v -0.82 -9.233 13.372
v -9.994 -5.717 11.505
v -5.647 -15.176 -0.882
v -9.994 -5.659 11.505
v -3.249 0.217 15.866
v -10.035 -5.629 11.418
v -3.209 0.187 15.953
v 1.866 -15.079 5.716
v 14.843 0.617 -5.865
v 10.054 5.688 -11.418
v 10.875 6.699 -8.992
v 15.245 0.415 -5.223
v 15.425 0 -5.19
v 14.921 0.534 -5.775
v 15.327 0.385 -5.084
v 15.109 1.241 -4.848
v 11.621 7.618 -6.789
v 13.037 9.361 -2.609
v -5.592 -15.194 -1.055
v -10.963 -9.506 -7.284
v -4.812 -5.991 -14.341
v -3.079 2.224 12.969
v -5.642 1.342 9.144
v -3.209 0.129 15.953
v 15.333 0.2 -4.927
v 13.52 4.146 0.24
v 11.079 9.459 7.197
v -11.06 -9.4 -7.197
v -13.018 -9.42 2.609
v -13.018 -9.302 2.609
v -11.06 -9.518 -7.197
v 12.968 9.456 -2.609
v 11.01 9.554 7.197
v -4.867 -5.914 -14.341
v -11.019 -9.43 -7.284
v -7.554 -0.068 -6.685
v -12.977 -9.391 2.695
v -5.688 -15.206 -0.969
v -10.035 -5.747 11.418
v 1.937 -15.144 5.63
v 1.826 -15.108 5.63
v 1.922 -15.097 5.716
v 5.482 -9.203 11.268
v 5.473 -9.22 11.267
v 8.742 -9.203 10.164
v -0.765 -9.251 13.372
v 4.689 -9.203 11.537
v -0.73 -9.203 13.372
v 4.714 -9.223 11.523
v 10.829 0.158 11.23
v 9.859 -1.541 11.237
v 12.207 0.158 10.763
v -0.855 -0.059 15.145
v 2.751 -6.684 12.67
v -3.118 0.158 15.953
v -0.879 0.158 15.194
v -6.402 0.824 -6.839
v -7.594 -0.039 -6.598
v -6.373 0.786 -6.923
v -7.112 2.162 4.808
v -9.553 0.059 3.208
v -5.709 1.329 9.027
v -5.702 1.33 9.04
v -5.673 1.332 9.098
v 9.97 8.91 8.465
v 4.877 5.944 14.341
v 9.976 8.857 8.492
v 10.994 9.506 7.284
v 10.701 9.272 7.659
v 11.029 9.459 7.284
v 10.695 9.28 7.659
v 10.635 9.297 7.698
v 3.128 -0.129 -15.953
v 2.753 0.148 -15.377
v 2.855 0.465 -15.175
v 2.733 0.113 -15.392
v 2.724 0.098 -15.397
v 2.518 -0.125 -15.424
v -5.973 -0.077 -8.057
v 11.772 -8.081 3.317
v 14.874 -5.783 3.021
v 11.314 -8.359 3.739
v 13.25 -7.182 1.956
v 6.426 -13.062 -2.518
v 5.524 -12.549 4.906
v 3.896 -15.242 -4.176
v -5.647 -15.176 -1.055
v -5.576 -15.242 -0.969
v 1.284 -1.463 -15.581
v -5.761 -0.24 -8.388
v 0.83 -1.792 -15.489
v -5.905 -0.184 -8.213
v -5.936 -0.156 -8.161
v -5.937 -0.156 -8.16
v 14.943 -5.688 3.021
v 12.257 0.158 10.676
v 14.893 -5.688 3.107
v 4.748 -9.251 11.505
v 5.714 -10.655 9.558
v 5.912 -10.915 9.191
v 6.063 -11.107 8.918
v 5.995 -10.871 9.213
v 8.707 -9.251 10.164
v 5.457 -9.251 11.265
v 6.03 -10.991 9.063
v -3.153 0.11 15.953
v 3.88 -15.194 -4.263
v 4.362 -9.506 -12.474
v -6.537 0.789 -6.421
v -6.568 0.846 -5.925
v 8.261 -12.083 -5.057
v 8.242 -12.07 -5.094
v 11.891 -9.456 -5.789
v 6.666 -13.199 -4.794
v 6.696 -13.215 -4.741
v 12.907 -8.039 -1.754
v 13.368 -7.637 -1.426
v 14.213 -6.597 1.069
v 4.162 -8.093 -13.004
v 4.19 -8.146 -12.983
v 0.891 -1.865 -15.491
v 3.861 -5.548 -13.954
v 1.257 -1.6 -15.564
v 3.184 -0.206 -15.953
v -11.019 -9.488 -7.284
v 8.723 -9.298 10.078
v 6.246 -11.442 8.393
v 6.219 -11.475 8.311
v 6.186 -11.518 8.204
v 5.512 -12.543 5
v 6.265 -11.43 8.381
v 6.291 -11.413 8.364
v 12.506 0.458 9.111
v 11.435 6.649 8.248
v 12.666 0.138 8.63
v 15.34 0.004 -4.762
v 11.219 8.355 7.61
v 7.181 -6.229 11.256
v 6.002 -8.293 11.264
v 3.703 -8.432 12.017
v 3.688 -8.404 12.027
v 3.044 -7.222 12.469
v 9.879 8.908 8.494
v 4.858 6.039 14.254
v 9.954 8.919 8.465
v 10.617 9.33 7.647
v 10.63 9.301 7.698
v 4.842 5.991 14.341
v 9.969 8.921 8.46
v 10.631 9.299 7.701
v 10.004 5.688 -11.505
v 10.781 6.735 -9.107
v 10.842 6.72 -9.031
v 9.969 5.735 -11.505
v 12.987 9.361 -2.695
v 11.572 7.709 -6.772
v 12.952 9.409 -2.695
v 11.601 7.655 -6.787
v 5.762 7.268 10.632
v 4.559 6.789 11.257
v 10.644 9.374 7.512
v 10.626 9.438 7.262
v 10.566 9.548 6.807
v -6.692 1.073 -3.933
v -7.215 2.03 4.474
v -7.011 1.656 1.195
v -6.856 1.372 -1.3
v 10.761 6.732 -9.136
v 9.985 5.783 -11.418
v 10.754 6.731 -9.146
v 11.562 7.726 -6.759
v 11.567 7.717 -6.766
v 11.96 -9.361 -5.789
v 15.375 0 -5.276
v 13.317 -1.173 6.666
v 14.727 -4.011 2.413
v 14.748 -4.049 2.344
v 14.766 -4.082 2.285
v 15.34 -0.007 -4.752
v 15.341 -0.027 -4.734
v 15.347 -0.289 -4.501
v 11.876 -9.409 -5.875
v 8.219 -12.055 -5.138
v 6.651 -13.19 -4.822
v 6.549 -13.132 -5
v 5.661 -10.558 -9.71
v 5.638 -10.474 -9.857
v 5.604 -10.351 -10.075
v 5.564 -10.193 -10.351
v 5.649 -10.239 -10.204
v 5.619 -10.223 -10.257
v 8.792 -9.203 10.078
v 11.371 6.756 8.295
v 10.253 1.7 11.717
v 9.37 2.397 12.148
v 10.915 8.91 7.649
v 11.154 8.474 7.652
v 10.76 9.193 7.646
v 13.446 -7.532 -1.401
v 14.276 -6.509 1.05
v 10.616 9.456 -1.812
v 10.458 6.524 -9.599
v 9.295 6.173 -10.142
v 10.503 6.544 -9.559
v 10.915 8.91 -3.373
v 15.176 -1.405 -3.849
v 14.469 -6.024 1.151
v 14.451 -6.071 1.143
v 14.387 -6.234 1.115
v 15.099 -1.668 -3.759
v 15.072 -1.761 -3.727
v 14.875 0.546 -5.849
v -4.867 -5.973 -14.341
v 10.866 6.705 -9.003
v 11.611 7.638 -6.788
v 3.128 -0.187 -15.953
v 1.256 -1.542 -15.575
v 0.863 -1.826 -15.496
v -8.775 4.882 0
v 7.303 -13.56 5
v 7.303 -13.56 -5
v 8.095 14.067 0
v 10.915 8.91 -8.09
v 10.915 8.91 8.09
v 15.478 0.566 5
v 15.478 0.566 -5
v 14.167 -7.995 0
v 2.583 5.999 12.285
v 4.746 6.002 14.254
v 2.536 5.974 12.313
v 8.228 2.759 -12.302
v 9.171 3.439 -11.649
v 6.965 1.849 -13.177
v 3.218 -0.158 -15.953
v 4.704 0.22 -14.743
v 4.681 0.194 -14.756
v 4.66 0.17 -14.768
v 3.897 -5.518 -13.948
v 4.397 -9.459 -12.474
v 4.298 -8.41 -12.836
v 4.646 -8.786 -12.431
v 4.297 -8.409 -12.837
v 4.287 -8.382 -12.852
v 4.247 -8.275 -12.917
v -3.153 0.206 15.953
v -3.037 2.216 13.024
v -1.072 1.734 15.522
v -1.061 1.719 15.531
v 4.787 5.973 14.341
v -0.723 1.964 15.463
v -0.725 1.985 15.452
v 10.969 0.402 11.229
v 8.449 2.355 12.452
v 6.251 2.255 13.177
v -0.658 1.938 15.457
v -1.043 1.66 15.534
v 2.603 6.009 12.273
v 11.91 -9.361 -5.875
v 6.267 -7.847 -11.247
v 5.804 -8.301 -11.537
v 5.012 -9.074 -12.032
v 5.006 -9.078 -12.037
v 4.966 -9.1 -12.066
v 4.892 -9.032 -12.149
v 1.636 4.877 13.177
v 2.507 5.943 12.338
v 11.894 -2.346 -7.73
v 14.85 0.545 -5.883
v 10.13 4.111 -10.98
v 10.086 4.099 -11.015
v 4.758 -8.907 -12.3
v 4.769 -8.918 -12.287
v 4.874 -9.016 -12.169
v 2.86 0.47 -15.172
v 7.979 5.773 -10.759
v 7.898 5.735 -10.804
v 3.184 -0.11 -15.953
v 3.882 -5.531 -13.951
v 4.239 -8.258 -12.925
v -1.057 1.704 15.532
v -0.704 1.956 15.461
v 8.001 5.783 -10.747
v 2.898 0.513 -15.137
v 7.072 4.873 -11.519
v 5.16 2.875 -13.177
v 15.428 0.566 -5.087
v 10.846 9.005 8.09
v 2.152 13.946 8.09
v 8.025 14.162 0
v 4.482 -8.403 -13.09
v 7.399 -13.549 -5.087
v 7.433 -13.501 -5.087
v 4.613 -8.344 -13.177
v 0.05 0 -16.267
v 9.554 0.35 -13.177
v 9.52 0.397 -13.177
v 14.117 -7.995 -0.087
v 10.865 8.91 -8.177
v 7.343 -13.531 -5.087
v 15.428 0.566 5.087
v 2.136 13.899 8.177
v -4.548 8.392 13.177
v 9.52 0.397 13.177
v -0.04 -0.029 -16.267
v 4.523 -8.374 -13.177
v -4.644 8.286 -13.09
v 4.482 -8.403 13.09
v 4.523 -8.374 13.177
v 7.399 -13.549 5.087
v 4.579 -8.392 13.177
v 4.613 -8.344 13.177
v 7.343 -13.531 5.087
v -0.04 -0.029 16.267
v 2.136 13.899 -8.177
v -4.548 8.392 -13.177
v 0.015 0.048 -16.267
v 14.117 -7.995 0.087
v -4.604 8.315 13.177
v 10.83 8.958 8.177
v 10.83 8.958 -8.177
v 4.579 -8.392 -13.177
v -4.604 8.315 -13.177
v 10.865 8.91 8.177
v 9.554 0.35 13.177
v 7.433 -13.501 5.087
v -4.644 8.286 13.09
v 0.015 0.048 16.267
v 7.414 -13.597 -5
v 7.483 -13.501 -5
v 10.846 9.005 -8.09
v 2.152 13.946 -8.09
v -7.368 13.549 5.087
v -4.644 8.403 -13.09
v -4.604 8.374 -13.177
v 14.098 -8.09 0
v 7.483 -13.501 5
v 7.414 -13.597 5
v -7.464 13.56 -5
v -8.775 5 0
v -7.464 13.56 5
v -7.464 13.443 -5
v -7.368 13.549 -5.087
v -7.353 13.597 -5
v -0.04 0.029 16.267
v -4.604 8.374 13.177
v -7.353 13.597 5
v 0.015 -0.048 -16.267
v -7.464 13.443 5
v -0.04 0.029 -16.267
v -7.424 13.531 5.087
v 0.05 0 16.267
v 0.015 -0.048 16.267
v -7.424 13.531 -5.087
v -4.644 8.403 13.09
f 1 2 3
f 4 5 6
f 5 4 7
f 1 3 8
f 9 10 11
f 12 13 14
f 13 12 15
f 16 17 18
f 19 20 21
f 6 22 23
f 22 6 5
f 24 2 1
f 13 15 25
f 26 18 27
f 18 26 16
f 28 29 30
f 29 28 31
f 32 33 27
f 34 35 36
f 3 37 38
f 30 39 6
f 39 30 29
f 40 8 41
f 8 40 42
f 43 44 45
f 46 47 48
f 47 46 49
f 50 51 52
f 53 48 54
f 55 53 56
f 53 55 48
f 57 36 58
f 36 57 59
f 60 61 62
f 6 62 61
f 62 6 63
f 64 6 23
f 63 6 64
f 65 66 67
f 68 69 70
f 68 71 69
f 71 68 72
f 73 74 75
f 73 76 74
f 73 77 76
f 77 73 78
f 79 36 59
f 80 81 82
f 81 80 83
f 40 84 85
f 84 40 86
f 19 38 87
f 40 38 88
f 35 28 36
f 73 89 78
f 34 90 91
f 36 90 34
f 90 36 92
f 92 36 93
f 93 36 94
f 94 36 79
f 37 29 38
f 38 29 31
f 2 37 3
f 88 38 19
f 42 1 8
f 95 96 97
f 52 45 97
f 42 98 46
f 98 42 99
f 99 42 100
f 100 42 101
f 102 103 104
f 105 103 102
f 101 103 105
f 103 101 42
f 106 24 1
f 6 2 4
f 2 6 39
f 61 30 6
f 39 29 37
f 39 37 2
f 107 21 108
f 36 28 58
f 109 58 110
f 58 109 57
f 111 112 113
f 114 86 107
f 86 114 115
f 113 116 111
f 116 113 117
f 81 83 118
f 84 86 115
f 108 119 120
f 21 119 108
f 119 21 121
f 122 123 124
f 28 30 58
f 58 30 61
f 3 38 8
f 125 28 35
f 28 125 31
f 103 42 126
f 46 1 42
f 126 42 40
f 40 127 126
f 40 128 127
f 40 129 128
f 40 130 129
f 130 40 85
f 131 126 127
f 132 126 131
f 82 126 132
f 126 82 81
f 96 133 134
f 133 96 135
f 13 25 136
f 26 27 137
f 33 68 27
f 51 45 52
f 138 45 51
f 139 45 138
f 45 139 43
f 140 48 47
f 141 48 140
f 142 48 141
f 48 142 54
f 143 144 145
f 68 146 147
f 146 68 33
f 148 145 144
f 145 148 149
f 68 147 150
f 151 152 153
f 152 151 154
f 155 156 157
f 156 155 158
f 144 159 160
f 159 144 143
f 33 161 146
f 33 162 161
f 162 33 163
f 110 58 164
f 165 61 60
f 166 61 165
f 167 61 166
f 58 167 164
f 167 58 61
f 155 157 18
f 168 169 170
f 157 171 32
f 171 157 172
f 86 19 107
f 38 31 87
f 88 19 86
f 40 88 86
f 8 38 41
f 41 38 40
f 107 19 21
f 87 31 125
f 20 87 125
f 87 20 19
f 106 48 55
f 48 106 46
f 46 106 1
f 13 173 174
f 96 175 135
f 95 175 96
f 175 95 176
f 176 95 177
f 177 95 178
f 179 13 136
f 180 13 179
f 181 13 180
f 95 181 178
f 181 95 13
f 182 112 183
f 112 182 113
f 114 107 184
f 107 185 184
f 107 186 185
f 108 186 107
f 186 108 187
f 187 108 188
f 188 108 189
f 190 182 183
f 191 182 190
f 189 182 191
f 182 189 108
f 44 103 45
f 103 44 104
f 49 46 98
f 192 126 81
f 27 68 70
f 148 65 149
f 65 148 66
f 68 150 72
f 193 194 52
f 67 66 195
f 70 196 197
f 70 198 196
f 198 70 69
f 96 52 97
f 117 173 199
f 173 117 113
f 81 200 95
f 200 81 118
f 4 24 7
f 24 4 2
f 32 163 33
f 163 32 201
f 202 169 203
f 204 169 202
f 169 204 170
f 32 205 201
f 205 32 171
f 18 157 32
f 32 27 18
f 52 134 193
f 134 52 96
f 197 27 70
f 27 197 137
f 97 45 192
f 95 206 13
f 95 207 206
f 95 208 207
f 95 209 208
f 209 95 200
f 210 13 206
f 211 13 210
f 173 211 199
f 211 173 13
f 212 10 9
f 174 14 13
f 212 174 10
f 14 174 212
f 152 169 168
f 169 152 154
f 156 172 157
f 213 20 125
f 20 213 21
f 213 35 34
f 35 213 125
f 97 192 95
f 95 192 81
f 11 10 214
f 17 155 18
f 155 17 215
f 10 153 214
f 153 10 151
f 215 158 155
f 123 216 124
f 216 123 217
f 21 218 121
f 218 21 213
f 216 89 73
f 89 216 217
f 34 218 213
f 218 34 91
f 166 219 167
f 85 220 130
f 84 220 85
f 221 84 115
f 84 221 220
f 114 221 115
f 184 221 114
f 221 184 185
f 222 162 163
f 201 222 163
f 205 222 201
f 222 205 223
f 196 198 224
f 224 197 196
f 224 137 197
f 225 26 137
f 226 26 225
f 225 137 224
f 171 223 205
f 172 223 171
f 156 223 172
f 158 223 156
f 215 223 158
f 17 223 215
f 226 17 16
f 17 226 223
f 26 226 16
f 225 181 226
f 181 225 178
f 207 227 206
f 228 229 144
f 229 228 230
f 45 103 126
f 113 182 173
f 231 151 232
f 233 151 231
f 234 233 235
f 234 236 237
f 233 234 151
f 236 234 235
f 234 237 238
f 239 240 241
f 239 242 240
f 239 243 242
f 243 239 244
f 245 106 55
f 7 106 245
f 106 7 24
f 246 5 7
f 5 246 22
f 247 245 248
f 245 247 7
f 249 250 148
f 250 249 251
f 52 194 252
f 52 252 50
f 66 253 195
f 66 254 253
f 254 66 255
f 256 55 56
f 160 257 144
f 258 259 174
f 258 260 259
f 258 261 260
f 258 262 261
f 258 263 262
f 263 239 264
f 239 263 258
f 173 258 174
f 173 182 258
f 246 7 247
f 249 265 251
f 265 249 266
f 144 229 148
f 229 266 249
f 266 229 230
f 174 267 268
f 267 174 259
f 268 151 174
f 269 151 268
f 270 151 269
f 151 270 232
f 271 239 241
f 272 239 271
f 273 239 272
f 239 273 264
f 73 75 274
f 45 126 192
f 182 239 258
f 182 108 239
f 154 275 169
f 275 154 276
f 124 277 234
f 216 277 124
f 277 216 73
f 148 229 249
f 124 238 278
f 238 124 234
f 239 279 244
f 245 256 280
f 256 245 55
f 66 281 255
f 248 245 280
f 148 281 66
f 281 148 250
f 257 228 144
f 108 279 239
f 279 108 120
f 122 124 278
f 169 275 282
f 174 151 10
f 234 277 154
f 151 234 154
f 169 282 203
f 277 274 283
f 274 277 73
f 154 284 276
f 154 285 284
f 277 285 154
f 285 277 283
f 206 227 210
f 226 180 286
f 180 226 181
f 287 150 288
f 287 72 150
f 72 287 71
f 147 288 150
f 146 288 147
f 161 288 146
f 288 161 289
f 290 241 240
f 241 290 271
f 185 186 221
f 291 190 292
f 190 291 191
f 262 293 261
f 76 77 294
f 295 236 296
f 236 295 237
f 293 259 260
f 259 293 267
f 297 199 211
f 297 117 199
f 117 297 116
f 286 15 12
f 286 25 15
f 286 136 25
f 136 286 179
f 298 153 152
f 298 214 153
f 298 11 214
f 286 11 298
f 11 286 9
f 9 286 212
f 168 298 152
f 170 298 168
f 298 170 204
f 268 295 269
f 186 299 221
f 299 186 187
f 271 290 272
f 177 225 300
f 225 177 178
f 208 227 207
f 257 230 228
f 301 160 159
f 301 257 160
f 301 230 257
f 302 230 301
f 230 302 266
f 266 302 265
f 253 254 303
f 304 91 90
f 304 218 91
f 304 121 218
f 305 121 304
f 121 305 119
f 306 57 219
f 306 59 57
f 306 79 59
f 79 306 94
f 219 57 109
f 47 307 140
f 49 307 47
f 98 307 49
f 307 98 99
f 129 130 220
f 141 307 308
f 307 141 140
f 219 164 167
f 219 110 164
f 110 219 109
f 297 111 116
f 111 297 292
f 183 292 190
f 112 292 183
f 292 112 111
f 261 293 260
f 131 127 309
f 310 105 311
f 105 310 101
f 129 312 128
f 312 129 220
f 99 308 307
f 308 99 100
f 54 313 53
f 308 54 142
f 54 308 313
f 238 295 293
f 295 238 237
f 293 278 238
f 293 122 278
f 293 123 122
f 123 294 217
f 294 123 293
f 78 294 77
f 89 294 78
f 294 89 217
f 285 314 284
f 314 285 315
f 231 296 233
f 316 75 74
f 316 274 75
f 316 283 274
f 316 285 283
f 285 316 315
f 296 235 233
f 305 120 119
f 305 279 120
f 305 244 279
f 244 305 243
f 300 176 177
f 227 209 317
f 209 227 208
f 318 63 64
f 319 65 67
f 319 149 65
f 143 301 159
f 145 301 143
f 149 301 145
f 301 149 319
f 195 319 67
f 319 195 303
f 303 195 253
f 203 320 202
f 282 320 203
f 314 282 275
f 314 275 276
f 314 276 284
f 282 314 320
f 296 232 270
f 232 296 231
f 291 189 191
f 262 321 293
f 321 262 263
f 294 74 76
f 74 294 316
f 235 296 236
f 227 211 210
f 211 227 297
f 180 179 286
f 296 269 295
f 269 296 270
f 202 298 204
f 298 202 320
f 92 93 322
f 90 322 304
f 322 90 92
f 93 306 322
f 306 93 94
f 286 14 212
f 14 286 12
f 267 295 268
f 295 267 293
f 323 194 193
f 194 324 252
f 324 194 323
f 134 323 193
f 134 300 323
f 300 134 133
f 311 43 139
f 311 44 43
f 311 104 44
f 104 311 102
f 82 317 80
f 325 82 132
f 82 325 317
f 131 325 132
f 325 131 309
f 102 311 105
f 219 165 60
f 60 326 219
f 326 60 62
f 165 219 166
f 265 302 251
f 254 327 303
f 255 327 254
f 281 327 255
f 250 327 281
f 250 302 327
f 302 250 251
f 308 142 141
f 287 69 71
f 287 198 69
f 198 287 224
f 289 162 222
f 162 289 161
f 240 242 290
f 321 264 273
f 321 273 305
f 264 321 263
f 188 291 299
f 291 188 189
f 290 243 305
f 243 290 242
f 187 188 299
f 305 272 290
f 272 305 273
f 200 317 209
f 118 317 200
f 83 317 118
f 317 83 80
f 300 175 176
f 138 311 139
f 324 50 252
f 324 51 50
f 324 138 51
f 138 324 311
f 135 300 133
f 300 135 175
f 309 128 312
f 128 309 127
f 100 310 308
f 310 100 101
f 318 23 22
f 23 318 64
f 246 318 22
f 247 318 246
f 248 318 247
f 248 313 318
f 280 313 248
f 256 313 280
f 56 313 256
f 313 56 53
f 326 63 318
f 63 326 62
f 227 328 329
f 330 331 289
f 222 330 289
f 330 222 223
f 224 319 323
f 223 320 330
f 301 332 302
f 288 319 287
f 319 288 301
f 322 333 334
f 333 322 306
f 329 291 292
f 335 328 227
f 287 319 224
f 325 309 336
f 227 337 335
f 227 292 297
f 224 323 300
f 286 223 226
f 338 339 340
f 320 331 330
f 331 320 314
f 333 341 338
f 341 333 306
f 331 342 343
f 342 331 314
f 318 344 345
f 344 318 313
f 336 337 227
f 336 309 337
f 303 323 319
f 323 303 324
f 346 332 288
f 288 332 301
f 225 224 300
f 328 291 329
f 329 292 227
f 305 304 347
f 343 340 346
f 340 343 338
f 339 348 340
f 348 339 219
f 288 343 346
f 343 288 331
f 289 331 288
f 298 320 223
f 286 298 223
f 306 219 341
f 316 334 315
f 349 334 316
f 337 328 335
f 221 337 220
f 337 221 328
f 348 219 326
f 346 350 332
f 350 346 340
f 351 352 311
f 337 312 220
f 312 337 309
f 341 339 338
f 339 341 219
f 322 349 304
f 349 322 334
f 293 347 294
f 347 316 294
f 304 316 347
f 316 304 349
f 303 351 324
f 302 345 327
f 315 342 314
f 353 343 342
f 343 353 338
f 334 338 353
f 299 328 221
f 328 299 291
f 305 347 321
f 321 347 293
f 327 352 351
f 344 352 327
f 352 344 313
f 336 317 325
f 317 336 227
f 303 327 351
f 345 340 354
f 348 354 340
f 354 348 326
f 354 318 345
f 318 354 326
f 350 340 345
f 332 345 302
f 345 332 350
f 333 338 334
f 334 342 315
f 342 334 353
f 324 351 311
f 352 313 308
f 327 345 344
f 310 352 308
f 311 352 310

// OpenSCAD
// Auto-generated OpenSCAD file

    inner_points = 10*[[3.624317002584078e-13, 2.953319001906976e-13, 1.618033988749895], [-3.624317002584078e-13, -2.953319001906976e-13, -1.618033988749895], [1.4067368092917045, -0.799453274515584, -1.6918183476653185e-13], [0.799453274515584, 1.4067368092917045, -4.358384739871853e-13], [-0.4563237566115435, 0.834432217941957, 1.3090169943748973], [-0.45632375661213, 0.8344322179414793, -1.3090169943749976], [0.45632375661213, -0.8344322179414793, 1.3090169943749976], [0.4563237566115435, -0.834432217941957, -1.3090169943748973], [0.9504130526801611, 0.03497894342637298, 1.309016994374728], [0.9504130526795745, 0.03497894342589519, -1.3090169943751668], [-0.7383473480718745, 1.350139689937751, 0.49999999999991895], [-0.7383473480720981, 1.3501396899375684, -0.500000000000081], [0.7383473480720981, -1.3501396899375684, 0.500000000000081], [0.7383473480718745, -1.350139689937751, -0.49999999999991895], [1.5378006225876821, 0.056597119354135916, 0.4999999999996452], [1.5378006225874585, 0.056597119353953396, -0.5000000000003548], [0.21206570460806262, 1.3851186333639414, 0.8090169943746471], [0.21206570460770024, 1.3851186333636463, -0.8090169943752478], [1.0814768659759149, 0.8910293372959104, 0.8090169943745426], [1.0814768659755525, 0.8910293372956152, -0.8090169943753523], [-0.8694111613678522, 0.49408929606803104, 1.0456012416478531e-13], [-0.5873875699075214, -0.02161817592776291, 0.809016994375083], [-0.5873875699078839, -0.021618175928058286, -0.8090169943748119], [-0.13106381329575384, -0.8560503938695374, 0.5000000000001856], [-0.13106381329597788, -0.8560503938697199, -0.49999999999981437]];

    outer_points = 10*[[-0.4827045868491299, -0.5943615441771533, -1.4253998124694895], [0.4827045868491299, 0.5943615441771533, 1.4253998124694895], [1.5325422089871936, 0.0, -0.5189878287807413], [0.19064272411334998, -1.5049147296618652, 0.56295736689317], [-1.097875476912321, -0.9458928165929492, -0.7197153641977476], [-0.31684304886495324, 0.01580436349155695, 1.5866299799356127], [0.31684304886495324, -0.01580436349155695, -1.5866299799356127], [1.097875476912321, 0.9458928165929492, 0.7197153641977476], [0.43466673207487266, -0.9458928165929492, -1.2387031929784889], [1.2156991601222404, 0.01580436349155695, 1.0676421511548713], [-1.2936952502100056, -0.9361251827846091, 0.2608758909720249], [-0.9953674090117679, -0.5687895468772561, 1.1418214226358954], [0.9953674090117679, 0.5687895468772561, -1.1418214226358954], [1.2936952502100056, 0.9361251827846091, -0.2608758909720249], [1.186010133125118, -0.9361251827846091, -0.5788640557427255], [1.4843379743233558, -0.5687895468772561, 0.3020814759211451], [-0.5607006769368953, -1.5146823634702054, -0.09688177034259327], [-0.07799609008776537, -0.9203208192930521, 1.3285180421268963], [0.38646249741103483, -1.5146823634702054, -0.4176338882766023], [0.8691670842601649, -0.9203208192930521, 1.0077659241928874], [-0.9471631743479302, 0.0, 0.32075211793400904], [-0.7513434010502453, -0.009767633808340115, -0.6598391372357633], [-0.26863881420111535, 0.5845939103688131, 0.7655606752337263], [0.04820423466383783, 0.5687895468772561, -0.8210693047018864], [0.34653207586207563, 0.9361251827846091, 0.059876226961984164]];

    // Convex hull for inner set (I)
    module inner_hull() {
        hull() {
            for (p = inner_points) {
                translate(p) sphere(r=0.1);
            }
        }
    }

    // Convex hull for outer set (O) minus inner hull (O \ I)
    module outer_minus_inner() {
        difference() {
            hull() {
                for (p = outer_points) {
                    translate(p) sphere(r=0.1);
                }
            }
            inner_hull(); // Subtract inner hull
        }
    }

    // Convex hull for outer set (O) minus all translated inner hulls
    module outer_minus_AllTranslationInner() {
        difference() {
            hull() {
                for (p = outer_points) {
                    translate(p) sphere(r=0.1);
                }
            }
            hull() {
                translate([0,0,50]) inner_hull();
                translate([0,0,-50]) inner_hull();
            }; // Subtract translated inner hulls
        }
    }

    // Difference between outer_minus_inner and outer_minus_AllTranslationInner
    module outer_minus_inner_diff() {
        difference() {
            // Outer minus inner
            difference() {
                hull() {
                    for (p = outer_points) {
                        translate(p) sphere(r=0.1);
                    }
                }
                inner_hull();
            }

            // Subtract Outer minus AllTranslationInner
            difference() {
                hull() {
                    for (p = outer_points) {
                        translate(p) sphere(r=0.1);
                    }
                }
                hull() {
                    translate([0,0,50]) inner_hull();
                    translate([0,0,-50]) inner_hull();
                };
            }
        }
    }

    // Rendering all with colors applied
    color([1, 0, 0, 0.5]) inner_hull(); // Transparent red
    color([0, 1, 0, 1]) outer_minus_AllTranslationInner(); // Opaque green
    color([1, 1, 0, 1]) outer_minus_inner_diff(); // Opaque yellow
    
